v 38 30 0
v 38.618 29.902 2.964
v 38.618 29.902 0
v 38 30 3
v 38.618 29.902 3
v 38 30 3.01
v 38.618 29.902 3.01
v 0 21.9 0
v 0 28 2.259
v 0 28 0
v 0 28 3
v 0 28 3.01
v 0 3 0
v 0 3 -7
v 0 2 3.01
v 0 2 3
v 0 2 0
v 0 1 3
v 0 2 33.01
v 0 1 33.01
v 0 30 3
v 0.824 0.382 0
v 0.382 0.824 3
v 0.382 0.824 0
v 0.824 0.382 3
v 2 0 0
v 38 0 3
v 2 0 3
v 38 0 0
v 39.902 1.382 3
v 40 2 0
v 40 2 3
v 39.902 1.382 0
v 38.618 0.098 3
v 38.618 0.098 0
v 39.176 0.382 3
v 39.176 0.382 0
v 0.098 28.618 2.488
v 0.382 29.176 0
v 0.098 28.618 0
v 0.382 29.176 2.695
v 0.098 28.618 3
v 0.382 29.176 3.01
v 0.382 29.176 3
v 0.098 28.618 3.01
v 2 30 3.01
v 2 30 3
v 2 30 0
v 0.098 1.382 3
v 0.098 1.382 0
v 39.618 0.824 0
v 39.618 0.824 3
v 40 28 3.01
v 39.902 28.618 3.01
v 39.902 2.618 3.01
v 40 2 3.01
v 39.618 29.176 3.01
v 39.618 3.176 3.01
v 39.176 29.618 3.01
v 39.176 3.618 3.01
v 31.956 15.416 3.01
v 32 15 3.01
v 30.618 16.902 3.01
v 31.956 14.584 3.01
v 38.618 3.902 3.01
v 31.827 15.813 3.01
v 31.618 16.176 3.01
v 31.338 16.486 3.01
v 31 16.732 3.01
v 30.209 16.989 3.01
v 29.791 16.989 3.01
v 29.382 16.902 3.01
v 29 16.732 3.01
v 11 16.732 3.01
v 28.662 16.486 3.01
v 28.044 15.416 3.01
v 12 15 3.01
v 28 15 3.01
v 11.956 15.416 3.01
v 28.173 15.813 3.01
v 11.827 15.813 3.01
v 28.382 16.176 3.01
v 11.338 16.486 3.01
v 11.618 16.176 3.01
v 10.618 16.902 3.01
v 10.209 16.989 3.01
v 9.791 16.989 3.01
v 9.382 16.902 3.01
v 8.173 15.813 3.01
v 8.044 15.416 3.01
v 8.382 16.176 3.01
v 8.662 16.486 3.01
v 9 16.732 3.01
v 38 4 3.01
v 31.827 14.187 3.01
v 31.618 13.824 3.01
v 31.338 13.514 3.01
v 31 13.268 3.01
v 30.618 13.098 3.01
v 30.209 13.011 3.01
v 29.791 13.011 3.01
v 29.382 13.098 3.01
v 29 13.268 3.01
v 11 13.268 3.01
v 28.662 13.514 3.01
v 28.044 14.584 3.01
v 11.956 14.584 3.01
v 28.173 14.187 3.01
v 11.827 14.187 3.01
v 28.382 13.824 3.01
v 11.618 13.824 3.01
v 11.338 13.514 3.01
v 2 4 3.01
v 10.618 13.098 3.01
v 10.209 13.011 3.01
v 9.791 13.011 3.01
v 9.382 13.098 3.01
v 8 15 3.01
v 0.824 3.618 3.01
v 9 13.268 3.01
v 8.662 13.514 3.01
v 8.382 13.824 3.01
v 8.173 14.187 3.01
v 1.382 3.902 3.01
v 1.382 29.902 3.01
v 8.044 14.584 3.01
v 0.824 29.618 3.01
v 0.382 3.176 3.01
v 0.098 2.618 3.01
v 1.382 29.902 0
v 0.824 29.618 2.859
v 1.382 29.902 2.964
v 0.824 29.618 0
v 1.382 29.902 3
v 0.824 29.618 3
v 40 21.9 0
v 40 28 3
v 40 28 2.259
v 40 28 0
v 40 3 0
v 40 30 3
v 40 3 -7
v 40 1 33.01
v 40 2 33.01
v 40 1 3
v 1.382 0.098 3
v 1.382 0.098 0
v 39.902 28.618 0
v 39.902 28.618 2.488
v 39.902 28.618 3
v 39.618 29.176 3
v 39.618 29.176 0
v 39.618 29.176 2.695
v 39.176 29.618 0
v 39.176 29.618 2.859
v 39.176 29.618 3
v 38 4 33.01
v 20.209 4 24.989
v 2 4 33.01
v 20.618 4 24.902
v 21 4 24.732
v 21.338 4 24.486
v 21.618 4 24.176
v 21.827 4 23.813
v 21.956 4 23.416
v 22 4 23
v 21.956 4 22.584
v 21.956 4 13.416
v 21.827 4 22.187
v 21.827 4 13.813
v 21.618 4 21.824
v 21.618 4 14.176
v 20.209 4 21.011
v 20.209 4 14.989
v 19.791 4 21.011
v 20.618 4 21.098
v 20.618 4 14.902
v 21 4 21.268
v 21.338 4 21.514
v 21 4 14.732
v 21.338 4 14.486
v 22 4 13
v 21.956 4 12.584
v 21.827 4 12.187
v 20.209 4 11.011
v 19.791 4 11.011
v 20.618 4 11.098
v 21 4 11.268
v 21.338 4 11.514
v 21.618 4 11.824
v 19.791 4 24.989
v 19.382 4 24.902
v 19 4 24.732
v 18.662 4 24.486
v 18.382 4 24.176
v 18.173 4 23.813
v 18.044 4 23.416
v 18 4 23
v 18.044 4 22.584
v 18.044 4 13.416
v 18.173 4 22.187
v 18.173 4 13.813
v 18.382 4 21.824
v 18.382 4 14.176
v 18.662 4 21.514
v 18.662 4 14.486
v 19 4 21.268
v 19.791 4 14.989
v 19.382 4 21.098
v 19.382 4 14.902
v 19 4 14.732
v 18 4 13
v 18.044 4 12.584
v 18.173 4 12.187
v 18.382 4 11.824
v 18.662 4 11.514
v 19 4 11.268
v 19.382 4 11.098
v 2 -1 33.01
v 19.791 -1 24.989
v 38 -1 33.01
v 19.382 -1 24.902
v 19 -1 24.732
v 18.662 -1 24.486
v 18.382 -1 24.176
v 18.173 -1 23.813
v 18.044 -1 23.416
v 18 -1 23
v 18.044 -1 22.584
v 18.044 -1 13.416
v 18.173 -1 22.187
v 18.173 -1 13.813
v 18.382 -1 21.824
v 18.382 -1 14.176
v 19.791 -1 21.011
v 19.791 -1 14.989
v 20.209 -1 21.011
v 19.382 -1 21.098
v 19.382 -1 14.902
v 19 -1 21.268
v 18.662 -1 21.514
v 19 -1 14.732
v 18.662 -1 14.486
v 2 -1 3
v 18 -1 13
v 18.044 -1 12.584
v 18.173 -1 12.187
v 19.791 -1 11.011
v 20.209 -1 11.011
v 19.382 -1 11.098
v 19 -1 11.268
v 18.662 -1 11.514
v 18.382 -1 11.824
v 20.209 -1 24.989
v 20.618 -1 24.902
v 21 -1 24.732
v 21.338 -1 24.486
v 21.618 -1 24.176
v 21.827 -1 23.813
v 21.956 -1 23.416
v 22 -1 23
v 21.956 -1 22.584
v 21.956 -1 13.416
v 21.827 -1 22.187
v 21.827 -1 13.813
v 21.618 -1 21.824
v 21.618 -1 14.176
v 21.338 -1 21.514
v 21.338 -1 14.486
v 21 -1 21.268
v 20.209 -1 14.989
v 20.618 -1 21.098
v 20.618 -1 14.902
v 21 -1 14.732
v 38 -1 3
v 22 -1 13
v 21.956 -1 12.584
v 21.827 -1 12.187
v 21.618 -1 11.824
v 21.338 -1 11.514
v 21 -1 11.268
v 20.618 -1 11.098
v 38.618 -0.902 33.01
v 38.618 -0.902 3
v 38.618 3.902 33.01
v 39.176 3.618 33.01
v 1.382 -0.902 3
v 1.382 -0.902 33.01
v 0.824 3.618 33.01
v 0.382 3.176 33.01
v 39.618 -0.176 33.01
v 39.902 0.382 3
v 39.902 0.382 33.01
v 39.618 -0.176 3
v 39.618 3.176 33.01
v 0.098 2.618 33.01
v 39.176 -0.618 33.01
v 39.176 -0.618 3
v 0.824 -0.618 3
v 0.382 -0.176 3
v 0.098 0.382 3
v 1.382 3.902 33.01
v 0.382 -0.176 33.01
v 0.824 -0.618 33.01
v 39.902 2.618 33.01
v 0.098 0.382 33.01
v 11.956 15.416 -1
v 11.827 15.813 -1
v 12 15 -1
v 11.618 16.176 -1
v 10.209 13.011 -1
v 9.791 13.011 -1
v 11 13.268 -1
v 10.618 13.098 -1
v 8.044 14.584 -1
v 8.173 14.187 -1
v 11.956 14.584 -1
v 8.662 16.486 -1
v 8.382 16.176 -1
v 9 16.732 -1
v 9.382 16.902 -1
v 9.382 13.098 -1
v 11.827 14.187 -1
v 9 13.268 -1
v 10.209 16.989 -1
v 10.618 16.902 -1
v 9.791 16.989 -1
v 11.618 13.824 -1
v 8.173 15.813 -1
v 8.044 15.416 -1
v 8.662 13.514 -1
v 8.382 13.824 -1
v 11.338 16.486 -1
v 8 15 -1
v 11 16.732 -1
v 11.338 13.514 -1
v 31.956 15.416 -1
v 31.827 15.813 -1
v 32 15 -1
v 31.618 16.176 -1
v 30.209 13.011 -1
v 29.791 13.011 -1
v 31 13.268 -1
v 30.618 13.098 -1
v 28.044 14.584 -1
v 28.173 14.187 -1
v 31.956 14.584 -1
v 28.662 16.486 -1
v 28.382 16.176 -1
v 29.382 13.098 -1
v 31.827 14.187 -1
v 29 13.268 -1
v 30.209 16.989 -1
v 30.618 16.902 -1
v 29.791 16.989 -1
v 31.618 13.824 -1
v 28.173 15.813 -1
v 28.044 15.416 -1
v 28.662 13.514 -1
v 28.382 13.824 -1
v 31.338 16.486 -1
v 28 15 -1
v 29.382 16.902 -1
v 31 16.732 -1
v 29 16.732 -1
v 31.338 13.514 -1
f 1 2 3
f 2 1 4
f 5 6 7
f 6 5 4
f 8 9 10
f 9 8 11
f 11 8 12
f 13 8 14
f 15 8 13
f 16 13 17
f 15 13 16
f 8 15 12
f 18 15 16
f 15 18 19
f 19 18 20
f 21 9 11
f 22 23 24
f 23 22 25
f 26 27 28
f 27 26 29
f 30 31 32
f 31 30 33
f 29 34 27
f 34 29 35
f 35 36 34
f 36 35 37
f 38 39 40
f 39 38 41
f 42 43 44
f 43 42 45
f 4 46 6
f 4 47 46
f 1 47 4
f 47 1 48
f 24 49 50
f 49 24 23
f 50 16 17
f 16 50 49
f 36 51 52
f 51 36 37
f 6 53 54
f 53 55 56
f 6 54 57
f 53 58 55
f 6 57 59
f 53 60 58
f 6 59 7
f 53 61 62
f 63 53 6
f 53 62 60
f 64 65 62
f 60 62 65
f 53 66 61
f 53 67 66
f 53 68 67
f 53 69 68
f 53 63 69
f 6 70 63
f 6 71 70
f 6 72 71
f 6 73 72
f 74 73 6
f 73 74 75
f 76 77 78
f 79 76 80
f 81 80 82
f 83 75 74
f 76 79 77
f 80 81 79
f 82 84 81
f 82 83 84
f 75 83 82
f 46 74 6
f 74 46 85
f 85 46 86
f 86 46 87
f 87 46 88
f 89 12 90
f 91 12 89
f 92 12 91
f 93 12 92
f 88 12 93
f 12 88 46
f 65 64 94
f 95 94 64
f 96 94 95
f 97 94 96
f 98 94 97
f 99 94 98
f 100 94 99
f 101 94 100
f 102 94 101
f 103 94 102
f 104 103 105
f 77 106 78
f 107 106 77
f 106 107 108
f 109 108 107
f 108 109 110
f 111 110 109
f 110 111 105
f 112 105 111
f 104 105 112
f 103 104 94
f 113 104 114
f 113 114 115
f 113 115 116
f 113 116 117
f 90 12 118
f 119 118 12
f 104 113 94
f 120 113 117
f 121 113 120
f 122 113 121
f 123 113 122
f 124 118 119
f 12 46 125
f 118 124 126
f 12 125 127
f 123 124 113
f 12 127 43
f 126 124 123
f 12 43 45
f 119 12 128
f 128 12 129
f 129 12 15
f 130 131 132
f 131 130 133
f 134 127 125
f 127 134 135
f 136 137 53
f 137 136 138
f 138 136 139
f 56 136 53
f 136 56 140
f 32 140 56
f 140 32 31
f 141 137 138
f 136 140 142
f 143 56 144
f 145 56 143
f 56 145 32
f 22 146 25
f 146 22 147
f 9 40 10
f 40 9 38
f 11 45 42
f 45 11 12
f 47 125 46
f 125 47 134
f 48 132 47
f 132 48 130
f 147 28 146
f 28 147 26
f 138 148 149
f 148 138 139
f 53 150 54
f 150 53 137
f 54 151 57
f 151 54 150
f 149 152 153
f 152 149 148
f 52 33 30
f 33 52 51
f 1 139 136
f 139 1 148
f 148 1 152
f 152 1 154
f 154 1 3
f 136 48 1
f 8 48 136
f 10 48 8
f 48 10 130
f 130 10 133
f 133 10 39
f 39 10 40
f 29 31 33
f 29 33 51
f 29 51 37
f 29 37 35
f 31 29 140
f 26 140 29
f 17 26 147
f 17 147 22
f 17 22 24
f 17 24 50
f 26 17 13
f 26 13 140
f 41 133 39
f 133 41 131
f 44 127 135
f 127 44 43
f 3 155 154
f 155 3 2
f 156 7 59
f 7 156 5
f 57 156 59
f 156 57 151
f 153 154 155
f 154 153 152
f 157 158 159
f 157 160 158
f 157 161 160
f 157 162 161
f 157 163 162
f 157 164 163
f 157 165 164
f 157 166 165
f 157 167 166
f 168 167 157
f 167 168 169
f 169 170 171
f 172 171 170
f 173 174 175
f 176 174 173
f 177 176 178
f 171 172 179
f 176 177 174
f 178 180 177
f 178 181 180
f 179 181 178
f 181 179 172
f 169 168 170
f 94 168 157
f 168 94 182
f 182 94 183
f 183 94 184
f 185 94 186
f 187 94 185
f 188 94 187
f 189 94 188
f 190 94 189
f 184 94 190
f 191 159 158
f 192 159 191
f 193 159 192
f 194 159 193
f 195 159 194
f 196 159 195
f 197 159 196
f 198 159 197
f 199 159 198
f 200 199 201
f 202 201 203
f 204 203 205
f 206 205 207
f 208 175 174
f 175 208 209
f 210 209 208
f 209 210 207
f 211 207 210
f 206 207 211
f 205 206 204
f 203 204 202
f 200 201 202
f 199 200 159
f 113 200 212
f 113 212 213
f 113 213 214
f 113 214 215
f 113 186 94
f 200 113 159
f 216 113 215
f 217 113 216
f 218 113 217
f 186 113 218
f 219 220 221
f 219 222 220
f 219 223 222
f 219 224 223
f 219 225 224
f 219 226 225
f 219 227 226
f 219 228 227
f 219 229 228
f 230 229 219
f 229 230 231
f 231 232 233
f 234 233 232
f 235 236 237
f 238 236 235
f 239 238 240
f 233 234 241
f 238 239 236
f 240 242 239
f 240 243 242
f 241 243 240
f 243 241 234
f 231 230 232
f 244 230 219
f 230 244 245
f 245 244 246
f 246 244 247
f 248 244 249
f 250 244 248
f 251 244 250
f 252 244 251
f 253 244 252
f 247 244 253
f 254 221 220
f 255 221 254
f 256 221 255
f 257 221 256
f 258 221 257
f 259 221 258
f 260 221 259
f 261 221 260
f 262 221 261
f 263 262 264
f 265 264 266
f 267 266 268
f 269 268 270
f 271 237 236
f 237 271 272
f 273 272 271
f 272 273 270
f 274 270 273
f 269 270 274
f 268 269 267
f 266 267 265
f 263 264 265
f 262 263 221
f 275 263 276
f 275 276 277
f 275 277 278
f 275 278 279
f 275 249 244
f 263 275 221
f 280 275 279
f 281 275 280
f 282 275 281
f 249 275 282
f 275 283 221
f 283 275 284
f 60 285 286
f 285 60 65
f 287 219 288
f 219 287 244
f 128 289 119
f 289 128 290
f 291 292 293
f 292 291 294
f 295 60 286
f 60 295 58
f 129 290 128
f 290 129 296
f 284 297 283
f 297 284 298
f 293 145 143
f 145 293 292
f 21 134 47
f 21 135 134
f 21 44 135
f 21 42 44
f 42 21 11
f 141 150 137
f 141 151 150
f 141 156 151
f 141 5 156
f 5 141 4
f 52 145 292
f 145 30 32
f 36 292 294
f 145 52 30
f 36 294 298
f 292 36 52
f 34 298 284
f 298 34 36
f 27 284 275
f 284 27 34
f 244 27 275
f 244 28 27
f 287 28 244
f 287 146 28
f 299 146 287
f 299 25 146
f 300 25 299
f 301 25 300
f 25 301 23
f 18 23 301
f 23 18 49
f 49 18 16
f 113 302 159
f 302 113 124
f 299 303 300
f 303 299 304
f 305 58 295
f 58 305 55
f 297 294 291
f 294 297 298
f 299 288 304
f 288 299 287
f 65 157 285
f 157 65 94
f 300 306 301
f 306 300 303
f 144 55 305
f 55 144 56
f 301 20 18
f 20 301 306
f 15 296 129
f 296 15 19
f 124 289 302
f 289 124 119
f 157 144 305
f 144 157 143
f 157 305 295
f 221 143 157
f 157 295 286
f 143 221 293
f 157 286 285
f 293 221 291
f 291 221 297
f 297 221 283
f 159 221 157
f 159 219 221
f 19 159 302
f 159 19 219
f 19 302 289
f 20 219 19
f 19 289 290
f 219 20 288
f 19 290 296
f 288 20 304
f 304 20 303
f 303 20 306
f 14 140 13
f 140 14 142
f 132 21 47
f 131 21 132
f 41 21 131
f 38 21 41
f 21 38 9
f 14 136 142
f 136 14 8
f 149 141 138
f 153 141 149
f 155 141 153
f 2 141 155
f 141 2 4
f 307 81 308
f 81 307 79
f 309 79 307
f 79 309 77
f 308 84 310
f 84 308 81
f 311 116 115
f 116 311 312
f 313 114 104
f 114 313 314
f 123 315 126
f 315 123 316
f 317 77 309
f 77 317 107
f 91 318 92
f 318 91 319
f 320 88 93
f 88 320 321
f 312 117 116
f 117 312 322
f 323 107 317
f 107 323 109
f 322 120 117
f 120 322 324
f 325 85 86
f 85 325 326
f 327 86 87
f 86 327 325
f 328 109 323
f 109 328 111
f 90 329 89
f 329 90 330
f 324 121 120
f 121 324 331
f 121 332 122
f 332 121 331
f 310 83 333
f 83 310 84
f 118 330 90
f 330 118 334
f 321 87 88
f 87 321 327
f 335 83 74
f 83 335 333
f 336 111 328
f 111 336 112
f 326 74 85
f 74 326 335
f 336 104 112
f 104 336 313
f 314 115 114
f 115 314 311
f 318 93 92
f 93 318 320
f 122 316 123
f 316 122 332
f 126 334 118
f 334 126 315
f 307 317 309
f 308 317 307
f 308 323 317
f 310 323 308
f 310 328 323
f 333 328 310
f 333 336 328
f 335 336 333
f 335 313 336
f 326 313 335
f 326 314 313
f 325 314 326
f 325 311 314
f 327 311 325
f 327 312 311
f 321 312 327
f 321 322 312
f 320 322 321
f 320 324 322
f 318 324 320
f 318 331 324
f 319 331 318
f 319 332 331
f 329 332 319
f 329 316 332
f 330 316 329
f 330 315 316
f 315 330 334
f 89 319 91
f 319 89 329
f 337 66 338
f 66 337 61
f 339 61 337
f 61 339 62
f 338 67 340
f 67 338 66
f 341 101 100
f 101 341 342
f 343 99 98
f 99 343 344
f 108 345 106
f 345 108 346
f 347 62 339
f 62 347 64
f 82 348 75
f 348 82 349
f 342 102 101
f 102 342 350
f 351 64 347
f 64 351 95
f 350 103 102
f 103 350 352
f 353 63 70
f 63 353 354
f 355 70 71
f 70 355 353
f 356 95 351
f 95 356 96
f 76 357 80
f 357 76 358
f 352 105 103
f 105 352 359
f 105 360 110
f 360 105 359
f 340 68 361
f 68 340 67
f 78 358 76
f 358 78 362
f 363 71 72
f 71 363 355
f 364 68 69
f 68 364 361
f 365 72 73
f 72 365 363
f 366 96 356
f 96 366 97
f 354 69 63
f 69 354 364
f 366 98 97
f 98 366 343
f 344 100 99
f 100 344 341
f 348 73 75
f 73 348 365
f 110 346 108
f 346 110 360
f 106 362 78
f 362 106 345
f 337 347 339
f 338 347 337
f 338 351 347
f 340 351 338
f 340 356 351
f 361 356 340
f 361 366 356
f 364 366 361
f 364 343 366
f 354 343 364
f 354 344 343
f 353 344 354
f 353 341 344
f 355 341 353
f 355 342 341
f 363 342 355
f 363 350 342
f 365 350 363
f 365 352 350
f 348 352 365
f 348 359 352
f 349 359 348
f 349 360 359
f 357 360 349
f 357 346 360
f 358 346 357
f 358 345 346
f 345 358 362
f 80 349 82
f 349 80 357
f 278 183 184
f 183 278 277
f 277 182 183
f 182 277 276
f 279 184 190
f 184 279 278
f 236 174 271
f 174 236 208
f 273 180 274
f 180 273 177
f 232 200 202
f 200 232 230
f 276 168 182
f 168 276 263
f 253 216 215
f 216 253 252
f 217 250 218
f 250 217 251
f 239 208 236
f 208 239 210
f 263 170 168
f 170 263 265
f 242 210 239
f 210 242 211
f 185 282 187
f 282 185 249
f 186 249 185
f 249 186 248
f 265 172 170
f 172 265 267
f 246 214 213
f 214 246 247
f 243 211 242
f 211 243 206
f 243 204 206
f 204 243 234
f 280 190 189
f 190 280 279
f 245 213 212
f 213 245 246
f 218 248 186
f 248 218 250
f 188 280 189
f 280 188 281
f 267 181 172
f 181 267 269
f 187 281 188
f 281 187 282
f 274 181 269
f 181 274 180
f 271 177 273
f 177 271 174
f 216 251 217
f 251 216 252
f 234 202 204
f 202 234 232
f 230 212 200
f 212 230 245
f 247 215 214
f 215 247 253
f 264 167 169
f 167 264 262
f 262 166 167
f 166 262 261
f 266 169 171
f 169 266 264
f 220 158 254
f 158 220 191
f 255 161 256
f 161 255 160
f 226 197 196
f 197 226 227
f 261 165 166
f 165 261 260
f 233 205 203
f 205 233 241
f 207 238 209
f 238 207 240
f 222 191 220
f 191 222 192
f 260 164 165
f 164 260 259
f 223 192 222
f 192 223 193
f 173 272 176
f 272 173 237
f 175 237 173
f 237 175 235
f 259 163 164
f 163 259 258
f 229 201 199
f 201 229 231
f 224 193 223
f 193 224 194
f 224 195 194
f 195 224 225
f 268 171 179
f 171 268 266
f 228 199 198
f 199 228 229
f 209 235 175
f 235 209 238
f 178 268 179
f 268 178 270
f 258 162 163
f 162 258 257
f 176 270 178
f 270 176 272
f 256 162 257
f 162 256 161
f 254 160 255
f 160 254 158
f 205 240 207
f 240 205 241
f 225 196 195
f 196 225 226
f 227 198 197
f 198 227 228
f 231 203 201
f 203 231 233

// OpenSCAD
// Parametric L-Bracket
// Adjustable dimensions for mounting applications

// Parameters
base_length = 40;      // Length of horizontal base
base_width = 30;       // Width of horizontal base  
base_thickness = 3;    // Thickness of base plate
wall_height = 30;      // Height of vertical wall
wall_thickness = 3;    // Thickness of vertical wall
hole_diameter = 4;     // Diameter of mounting holes
hole_spacing = 20;     // Spacing between holes
fillet_radius = 2;     // Radius for rounded edges

module rounded_cube(size, radius) {
    hull() {
        for (x = [radius, size[0] - radius]) {
            for (y = [radius, size[1] - radius]) {
                for (z = [0, size[2]]) {
                    translate([x, y, z])
                        cylinder(h=0.01, r=radius, center=false, $fn=20);
                }
            }
        }
    }
}

module bracket() {
    difference() {
        union() {
            // Horizontal base
            rounded_cube([base_length, base_width, base_thickness], fillet_radius);
            
            // Vertical wall
            translate([0, 0, base_thickness])
                rounded_cube([base_length, wall_thickness, wall_height], fillet_radius);
            
            // Connecting fillet
            translate([0, wall_thickness, base_thickness])
                rotate([0, 90, 0])
                    linear_extrude(height=base_length)
                        polygon([[0, 0], [wall_height/3, 0], [0, base_width - wall_thickness]]);
        }
        
        // Mounting holes in base
        for (x = [base_length/4, 3*base_length/4]) {
            translate([x, base_width/2, -1])
                cylinder(h=base_thickness + 2, d=hole_diameter, $fn=30);
        }
        
        // Mounting holes in wall
        for (z = [base_thickness + wall_height/3, base_thickness + 2*wall_height/3]) {
            translate([base_length/2, -1, z])
                rotate([-90, 0, 0])
                    cylinder(h=wall_thickness + 2, d=hole_diameter, $fn=30);
        }
    }
}

// Generate the bracket
bracket();
